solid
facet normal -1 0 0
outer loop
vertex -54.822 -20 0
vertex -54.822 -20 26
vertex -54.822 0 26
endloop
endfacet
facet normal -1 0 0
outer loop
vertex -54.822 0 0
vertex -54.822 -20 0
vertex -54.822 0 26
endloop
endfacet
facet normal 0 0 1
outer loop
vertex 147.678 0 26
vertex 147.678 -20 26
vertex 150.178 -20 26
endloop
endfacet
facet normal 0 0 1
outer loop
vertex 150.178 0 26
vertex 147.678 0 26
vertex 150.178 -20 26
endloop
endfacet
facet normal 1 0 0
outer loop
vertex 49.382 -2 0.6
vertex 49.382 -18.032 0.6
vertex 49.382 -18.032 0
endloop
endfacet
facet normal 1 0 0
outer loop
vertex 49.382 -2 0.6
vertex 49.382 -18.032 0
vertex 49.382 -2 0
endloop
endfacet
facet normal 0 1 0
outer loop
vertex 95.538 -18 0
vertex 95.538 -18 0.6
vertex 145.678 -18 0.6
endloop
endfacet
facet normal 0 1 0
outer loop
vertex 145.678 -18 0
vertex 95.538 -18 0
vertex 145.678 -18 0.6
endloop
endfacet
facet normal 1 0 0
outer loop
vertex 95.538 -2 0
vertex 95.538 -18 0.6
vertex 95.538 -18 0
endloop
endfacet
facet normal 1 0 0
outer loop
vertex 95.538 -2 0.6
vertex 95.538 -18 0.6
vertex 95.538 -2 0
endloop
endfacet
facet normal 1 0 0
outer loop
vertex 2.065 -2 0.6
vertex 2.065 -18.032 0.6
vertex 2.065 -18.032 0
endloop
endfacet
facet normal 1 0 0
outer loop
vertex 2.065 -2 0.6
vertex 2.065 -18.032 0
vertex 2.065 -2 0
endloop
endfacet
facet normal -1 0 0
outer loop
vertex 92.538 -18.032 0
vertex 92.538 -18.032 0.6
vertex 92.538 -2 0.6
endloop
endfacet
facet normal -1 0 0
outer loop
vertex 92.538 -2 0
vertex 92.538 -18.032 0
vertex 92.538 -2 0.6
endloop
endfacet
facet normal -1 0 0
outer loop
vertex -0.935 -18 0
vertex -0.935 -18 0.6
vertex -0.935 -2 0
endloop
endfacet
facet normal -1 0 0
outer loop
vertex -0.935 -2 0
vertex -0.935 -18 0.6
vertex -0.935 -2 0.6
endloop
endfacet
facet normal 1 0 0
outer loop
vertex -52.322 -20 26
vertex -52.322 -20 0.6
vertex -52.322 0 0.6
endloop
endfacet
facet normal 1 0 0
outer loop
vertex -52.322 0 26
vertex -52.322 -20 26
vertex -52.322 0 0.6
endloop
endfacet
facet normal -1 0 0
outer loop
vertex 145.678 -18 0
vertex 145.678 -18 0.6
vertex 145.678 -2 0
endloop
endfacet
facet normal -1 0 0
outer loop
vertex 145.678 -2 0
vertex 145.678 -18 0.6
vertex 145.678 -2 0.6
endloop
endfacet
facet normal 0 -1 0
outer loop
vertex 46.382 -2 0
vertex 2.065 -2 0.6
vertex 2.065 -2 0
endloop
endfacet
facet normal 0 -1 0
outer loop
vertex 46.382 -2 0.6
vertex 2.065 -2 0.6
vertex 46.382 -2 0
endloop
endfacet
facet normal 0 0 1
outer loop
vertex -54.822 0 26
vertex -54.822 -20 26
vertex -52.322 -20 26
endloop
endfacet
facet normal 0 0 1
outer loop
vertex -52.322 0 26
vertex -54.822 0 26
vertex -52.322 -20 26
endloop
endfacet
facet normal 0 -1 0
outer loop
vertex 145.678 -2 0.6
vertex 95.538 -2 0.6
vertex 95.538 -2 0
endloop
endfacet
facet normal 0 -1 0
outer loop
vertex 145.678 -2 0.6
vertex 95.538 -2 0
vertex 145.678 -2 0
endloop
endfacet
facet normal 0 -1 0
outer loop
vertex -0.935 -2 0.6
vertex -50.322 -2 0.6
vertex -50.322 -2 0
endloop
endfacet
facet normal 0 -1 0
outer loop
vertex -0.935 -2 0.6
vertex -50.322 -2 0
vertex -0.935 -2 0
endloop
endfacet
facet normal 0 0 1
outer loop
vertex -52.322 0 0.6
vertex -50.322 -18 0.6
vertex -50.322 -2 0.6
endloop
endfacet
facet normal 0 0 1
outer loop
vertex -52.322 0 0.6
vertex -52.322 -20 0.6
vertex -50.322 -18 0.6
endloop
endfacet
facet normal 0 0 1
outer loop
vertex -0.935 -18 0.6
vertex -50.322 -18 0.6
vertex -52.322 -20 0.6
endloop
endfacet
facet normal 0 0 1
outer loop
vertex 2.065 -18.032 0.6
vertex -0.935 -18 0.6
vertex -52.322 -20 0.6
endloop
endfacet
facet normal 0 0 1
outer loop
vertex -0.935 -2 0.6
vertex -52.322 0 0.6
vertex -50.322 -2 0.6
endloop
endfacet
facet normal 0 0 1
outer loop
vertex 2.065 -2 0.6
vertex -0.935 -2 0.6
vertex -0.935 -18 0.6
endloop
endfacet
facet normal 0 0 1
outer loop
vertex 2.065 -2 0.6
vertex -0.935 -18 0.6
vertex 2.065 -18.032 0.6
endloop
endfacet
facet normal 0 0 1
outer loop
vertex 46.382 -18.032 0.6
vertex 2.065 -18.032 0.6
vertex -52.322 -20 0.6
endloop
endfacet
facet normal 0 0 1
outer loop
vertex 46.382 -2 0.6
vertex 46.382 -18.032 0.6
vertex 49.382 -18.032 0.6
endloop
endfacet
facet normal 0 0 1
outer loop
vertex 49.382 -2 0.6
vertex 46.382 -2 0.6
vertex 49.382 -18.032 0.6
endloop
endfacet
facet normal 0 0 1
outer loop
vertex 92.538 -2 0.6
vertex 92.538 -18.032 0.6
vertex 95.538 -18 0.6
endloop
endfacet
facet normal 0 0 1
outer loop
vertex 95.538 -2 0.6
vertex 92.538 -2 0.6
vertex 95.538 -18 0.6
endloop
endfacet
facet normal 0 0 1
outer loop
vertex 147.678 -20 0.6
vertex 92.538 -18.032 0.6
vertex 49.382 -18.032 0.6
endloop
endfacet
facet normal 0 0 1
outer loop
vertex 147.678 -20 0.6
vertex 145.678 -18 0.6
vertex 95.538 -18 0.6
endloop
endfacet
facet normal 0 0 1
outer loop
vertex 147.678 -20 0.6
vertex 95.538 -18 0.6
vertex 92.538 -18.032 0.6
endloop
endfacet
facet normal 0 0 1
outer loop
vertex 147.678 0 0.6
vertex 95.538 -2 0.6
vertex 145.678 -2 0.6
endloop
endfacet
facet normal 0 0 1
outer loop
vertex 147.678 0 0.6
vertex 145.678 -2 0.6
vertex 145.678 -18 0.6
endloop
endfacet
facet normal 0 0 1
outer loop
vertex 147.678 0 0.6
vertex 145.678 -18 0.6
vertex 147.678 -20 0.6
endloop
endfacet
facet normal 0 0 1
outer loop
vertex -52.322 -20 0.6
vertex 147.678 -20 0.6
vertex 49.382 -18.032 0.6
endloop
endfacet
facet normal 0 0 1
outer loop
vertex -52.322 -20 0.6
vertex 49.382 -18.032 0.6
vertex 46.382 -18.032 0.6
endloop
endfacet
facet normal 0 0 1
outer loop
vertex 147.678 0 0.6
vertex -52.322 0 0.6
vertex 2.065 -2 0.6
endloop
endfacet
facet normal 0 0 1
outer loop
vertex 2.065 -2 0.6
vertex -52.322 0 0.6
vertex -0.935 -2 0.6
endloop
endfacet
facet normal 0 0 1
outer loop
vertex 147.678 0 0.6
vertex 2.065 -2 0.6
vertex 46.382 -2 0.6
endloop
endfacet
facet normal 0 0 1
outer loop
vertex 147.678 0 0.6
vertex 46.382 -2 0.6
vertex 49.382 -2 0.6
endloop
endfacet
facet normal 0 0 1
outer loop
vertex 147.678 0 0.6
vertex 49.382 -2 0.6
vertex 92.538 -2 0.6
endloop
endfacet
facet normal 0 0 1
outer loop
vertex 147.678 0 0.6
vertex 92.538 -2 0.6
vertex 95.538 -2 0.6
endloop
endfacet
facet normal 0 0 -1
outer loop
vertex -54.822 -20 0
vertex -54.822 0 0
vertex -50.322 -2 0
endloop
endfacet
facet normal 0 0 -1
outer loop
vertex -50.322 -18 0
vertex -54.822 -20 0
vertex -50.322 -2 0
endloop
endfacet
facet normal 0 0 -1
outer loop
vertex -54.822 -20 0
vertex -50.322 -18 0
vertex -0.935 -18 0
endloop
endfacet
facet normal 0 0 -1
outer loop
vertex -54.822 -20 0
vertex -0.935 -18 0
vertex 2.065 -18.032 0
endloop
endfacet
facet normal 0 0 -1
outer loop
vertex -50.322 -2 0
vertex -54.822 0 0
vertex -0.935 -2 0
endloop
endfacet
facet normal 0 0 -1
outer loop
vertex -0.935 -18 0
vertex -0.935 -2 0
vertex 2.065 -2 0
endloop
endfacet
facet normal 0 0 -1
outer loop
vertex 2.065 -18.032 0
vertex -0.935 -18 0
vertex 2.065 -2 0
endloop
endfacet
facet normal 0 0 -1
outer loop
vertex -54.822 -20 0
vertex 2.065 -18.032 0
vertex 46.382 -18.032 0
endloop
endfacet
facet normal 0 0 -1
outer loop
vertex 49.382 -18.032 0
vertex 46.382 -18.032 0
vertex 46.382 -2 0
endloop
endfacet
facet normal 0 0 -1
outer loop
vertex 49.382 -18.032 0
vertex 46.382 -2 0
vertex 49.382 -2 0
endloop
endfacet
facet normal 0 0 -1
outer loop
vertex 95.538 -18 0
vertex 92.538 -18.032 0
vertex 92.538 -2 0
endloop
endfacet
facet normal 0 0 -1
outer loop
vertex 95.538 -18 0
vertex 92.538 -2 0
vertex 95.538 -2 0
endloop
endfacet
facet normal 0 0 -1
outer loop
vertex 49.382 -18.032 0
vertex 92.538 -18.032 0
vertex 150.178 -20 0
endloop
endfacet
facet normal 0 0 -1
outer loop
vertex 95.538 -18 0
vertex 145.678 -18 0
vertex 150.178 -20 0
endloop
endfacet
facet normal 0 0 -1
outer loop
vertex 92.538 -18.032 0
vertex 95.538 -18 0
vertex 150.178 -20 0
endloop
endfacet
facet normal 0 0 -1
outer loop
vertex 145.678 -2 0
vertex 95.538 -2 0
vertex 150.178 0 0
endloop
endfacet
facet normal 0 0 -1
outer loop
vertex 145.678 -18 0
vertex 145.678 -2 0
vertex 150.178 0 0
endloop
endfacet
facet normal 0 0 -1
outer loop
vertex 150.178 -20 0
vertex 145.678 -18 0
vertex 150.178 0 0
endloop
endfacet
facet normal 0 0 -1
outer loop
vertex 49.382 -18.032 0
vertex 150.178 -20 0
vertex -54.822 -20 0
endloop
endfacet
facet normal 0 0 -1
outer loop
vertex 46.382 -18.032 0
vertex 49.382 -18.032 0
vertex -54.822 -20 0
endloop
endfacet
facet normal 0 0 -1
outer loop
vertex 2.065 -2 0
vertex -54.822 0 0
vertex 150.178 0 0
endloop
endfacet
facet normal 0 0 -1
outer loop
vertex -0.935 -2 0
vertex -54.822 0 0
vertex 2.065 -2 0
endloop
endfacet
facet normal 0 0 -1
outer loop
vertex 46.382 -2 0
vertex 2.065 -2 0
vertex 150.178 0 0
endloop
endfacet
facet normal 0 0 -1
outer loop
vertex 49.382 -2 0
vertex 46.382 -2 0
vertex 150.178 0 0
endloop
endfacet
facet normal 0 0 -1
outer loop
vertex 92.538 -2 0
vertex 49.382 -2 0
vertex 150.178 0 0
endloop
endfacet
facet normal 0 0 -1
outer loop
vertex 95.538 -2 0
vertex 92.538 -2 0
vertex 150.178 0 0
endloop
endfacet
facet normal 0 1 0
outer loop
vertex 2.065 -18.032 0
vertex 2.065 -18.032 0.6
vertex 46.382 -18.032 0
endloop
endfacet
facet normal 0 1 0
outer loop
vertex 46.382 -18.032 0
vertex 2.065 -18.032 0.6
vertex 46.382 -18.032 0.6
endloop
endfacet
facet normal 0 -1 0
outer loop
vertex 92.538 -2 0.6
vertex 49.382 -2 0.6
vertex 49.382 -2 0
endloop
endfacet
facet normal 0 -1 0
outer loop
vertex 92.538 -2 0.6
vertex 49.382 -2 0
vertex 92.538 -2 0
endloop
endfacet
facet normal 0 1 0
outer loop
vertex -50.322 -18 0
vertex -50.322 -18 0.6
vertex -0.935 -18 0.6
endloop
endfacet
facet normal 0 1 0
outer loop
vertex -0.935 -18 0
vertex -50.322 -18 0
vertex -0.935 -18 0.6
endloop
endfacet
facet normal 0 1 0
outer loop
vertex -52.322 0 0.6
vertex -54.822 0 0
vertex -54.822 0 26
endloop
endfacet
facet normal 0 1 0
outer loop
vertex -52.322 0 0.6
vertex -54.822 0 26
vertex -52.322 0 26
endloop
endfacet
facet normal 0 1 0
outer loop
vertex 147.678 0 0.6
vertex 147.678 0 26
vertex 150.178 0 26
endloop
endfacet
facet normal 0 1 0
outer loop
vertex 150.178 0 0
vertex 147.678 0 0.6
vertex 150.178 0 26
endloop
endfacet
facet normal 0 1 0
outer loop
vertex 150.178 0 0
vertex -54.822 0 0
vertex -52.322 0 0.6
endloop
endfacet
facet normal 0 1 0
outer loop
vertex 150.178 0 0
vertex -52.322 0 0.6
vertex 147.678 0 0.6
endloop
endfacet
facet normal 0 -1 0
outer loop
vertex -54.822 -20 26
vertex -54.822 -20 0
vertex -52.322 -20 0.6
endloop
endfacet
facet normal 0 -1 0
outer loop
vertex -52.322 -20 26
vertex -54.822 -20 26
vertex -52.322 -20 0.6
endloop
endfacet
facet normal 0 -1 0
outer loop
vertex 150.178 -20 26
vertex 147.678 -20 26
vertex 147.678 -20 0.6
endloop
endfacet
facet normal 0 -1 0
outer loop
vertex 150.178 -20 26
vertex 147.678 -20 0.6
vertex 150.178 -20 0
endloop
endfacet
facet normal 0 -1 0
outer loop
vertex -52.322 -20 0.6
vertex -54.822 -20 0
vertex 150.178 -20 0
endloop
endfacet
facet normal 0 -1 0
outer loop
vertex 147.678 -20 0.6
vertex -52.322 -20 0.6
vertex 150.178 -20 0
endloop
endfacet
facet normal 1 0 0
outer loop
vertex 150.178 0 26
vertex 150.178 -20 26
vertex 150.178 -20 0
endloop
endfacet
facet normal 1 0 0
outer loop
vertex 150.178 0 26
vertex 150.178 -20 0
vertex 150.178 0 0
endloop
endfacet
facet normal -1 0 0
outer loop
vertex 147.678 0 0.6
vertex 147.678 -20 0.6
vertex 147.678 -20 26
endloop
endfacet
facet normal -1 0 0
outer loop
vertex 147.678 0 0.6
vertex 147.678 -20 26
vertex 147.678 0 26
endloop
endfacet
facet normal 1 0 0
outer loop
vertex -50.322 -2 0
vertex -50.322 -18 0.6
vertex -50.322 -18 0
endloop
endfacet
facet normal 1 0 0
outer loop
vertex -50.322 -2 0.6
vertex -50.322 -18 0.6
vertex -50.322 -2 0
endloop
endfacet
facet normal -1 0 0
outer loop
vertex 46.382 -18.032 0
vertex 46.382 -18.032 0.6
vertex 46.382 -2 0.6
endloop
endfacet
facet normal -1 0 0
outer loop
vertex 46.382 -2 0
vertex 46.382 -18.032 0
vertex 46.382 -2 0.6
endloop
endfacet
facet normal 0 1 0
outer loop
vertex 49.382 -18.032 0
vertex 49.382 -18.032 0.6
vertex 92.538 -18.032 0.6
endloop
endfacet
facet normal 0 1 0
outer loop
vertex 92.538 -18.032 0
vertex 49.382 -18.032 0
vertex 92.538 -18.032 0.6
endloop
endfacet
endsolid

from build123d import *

# Parameters (mm, degrees)
F0_W     = 200
F0_H     = 20
F1_DEPTH = 0.6
F3_W     = 2.5
F3_H     = 20
F4_DEPTH = 26
F2_W     = 49.387012
F2_H     = 16
F2_W_2   = 44.316895
F2_H_2   = 16.031951
F2_W_3   = 43.155649
F2_W_4   = 50.140444
F5_DEPTH = 25


with BuildPart() as f1:
    # F0 (on Top) → F1 (new body)
    with BuildSketch(Plane.XY):
        with Locations((47.677944, -10)):
            Rectangle(F0_W, F0_H)
    extrude(amount=F1_DEPTH)

    # F3 (on Top) → F4 (join)
    with BuildSketch(Plane.XY):
        with Locations((-53.572056, -10)):
            Rectangle(F3_W, F3_H)
        with Locations((148.927944, -10)):
            Rectangle(F3_W, F3_H)
    extrude(amount=F4_DEPTH)

    # F2 (on face) → F5 (cut)
    with BuildSketch(Plane.XY.offset(0.6)):
        with Locations((-25.62855, -10)):
            Rectangle(F2_W, F2_H)
        with Locations((24.223403, -10.015975)):
            Rectangle(F2_W_2, F2_H_2)
        with Locations((70.959676, -10.015975)):
            Rectangle(F2_W_3, F2_H_2)
        with Locations((120.607722, -10)):
            Rectangle(F2_W_4, F2_H)
    extrude(amount=-F5_DEPTH, mode=Mode.SUBTRACT)


solid = f1.part
